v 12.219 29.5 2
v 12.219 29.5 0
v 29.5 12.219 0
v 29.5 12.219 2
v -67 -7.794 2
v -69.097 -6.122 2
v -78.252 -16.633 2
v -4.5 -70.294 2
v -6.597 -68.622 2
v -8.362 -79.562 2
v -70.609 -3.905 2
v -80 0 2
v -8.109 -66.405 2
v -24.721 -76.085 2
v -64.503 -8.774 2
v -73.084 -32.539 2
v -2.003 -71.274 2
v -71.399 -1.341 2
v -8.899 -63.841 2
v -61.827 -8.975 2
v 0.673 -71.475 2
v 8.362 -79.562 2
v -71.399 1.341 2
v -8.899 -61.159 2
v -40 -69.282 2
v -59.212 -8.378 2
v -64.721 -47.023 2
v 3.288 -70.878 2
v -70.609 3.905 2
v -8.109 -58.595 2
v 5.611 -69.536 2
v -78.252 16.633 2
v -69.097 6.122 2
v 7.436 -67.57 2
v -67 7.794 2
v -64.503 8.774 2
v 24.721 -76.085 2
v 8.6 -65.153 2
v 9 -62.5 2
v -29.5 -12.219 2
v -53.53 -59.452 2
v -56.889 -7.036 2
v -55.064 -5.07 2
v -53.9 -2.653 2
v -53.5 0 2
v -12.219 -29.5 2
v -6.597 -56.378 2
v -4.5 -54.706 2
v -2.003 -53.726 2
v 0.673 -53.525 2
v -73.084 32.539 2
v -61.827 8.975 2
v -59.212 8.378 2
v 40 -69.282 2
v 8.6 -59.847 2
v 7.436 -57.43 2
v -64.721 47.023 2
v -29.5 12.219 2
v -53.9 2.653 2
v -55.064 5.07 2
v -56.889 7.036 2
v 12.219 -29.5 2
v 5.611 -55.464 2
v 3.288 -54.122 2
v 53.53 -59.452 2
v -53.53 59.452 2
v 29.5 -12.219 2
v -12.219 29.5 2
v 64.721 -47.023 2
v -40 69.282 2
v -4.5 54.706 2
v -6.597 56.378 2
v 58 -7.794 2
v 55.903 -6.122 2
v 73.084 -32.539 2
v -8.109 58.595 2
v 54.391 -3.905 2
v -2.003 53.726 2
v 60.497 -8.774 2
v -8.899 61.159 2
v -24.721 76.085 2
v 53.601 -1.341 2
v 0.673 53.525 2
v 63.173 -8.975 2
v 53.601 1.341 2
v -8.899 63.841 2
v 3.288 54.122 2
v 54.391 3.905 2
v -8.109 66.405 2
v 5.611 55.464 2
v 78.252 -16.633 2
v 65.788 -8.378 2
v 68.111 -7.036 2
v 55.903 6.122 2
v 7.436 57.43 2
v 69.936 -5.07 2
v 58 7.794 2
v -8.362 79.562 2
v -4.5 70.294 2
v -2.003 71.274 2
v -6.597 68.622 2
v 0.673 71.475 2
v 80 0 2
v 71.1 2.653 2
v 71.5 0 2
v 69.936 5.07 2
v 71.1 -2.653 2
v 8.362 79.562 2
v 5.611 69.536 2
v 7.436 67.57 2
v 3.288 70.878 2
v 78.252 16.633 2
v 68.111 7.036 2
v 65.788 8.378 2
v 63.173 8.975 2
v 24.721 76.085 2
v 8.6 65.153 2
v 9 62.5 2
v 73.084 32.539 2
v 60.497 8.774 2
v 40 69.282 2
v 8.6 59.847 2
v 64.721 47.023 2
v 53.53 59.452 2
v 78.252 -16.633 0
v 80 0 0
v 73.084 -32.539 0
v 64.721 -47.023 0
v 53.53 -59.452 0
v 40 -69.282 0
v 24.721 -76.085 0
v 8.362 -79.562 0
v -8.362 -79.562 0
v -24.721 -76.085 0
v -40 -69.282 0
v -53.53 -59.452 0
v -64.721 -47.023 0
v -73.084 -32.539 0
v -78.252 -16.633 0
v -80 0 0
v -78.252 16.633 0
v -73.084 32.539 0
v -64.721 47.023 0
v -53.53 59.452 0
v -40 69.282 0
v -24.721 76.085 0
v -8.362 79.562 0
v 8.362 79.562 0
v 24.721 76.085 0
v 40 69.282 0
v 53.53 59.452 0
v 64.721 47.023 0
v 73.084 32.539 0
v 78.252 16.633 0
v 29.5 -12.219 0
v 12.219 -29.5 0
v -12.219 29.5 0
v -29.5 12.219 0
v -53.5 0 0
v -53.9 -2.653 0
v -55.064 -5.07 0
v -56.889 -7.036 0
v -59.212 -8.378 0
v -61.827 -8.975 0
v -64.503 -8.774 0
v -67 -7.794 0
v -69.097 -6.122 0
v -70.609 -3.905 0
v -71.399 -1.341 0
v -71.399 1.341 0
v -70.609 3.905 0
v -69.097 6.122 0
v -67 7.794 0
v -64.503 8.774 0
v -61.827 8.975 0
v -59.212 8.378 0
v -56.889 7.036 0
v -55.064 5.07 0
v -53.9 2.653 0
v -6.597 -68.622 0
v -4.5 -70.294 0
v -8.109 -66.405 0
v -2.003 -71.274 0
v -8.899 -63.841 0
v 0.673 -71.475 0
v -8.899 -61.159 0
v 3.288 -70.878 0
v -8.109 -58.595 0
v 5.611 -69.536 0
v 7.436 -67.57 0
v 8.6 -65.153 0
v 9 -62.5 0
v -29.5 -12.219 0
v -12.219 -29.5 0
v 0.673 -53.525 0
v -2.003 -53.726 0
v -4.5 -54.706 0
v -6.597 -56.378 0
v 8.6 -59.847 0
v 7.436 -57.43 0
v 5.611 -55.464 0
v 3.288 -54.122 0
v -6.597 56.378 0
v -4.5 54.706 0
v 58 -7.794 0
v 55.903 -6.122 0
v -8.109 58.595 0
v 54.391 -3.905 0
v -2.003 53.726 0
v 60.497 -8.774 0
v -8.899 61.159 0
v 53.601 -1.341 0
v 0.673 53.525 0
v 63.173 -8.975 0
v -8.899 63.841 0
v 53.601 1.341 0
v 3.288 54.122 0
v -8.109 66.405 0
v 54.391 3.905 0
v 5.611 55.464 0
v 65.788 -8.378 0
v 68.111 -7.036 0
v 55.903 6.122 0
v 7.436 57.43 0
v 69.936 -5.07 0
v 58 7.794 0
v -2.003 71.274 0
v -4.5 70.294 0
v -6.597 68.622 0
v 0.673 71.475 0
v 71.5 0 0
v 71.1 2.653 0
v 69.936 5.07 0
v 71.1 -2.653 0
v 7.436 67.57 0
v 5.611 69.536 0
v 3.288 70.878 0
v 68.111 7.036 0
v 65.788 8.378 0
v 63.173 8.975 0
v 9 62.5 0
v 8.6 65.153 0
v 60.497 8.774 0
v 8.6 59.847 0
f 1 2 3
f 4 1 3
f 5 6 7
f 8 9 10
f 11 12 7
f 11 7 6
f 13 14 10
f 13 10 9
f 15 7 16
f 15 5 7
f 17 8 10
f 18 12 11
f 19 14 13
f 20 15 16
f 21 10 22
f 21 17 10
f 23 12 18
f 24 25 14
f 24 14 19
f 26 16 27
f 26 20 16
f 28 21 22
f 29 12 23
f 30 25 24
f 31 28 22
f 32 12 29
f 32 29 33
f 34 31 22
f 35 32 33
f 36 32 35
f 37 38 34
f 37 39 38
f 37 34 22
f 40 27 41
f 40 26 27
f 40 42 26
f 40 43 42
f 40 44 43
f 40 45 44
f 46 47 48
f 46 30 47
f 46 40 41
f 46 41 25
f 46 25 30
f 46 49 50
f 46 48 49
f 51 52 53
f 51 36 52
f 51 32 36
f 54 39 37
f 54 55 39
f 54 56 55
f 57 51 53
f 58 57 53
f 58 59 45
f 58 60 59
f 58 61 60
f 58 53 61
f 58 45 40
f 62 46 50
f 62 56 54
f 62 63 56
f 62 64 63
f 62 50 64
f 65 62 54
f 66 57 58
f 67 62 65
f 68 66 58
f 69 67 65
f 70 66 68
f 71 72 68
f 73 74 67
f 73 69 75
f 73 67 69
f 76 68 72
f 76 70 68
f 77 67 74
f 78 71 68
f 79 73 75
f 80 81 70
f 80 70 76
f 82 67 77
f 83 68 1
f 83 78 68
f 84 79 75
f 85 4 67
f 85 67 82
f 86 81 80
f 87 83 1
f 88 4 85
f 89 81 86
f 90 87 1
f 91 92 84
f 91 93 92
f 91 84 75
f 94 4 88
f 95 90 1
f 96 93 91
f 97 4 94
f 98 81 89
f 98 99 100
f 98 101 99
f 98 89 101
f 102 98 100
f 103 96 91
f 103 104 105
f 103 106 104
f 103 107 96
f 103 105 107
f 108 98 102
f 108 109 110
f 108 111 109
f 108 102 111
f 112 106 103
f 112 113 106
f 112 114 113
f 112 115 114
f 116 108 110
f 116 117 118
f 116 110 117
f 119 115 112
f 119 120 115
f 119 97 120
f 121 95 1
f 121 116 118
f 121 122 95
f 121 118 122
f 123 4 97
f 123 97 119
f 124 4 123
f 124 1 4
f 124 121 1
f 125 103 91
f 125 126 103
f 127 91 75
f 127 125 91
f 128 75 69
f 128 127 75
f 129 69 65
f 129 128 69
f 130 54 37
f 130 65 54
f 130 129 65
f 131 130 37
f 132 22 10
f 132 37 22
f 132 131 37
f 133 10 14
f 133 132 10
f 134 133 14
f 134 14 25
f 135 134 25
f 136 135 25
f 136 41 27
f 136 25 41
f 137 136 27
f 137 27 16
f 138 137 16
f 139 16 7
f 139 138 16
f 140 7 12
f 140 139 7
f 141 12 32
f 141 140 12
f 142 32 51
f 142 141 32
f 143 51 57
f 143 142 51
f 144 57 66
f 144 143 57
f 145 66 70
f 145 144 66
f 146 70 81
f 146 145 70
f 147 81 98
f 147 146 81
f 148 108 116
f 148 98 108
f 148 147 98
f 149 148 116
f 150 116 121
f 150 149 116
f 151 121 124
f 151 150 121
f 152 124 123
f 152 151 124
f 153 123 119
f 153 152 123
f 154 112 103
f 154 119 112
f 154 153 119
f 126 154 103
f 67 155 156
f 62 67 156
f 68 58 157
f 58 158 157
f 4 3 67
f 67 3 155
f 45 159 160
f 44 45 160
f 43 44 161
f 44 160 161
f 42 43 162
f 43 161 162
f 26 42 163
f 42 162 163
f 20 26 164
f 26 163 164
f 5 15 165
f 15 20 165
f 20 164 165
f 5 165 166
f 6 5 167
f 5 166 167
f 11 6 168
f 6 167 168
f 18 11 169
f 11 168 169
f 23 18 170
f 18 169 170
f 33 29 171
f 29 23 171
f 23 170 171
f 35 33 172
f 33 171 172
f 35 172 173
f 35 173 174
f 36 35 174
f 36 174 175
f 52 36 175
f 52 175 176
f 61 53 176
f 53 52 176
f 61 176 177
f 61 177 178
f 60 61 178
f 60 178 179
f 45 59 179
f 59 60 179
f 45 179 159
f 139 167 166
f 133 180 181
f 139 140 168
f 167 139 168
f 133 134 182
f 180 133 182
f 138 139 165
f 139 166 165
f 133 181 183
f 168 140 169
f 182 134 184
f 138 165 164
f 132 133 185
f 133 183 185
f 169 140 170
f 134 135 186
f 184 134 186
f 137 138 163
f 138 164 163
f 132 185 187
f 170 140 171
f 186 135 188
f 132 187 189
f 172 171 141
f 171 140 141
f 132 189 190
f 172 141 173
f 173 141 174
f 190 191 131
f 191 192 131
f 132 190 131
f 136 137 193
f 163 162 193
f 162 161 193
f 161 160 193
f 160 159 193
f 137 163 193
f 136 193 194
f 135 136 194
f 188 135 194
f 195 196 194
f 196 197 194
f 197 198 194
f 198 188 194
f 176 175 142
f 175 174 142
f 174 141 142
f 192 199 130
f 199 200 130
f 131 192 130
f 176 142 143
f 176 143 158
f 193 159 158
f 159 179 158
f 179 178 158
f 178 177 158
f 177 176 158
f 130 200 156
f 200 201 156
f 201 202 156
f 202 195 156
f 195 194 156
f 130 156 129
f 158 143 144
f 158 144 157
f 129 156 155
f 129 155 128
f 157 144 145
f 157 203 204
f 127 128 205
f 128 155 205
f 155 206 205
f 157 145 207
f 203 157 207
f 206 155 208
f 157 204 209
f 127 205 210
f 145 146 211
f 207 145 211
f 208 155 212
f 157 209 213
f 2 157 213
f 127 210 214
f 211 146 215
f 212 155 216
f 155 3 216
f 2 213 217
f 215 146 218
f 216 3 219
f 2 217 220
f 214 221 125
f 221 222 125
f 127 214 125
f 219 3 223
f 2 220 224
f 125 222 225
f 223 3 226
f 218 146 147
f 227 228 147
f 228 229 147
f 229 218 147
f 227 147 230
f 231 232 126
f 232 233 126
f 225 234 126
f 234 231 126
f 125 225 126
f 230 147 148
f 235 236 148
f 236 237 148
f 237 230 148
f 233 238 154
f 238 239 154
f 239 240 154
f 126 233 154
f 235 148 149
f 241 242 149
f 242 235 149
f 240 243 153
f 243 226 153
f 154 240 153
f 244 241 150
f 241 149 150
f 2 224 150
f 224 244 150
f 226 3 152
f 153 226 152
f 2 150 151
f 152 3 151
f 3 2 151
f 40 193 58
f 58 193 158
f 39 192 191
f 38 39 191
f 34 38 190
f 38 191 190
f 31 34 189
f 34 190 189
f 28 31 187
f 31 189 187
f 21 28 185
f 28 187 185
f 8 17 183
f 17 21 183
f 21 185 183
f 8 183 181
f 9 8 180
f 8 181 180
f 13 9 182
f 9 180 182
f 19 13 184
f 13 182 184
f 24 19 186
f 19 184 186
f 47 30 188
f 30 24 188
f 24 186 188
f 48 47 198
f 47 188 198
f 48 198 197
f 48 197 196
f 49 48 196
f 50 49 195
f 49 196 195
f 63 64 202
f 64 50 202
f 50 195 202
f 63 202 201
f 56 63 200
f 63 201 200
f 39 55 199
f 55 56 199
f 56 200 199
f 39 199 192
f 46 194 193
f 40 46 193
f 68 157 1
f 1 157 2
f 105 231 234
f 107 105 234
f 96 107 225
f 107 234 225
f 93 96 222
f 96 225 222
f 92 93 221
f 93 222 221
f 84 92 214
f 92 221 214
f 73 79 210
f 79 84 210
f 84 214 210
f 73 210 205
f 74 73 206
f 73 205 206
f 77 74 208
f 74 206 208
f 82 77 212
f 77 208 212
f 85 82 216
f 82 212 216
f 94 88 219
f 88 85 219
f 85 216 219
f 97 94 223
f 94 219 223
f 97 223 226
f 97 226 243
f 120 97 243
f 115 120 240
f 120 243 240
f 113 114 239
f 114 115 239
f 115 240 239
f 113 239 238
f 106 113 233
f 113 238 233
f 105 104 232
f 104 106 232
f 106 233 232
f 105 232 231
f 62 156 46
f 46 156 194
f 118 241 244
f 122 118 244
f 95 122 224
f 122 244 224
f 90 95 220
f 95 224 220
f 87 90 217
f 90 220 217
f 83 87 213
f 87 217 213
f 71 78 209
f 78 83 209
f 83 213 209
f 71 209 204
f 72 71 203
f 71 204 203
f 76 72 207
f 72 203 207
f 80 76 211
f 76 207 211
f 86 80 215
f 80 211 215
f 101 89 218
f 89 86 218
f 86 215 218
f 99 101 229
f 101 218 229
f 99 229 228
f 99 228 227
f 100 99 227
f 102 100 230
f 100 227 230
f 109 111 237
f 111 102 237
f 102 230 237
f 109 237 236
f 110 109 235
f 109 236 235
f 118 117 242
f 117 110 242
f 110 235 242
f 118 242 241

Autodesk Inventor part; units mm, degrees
ref_plane "YZ Plane" through (0, 0, 0) normal (1, 0, 0) x (0, 1, 0)
ref_plane "XZ Plane" through (0, 0, 0) normal (0, 1, 0) x (-1, 0, 0)
ref_plane "XY Plane" through (0, 0, 0) normal (0, 0, 1) x (1, 0, 0)
sketch "Sketch1" plane through (0, 0, 0) normal (0, 0, 1) x (1, 0, 0)
  circle A0 centre (0, 0) radius 62.5 construction
  circle A1 centre (0, 0) radius 29.5 construction
  circle A2 centre (0, 0) radius 80
  line L0 (12.2193, 29.5) -> (29.5, 12.2193)
  line L1 (29.5, 12.2193) -> (29.5, -12.2193)
  line L2 (29.5, -12.2193) -> (12.2193, -29.5)
  line L3 (12.2193, -29.5) -> (-12.2193, -29.5)
  line L4 (-12.2193, -29.5) -> (-29.5, -12.2193)
  line L5 (-29.5, -12.2193) -> (-29.5, 12.2193)
  line L6 (-29.5, 12.2193) -> (-12.2193, 29.5)
  line L7 (-12.2193, 29.5) -> (12.2193, 29.5)
  circle A3 centre (0, 62.5) radius 9
  circle A4 centre (-62.5, 0) radius 9
  circle A5 centre (0, -62.5) radius 9
  circle A6 centre (62.5, 0) radius 9
  point P0 (0, 29.5)
  dimension "D_b_c" = 125
  dimension "D_min" = 59
  dimension "D_max" = 160
  dimension "Blt_hl" = 18
  dimension "d177" = 360
extrude "Plate5" add sketch "Sketch1" along normal blind 2
properties part number "PRS 1200-82 funnel FLANGE" material "Stainless Steel"
